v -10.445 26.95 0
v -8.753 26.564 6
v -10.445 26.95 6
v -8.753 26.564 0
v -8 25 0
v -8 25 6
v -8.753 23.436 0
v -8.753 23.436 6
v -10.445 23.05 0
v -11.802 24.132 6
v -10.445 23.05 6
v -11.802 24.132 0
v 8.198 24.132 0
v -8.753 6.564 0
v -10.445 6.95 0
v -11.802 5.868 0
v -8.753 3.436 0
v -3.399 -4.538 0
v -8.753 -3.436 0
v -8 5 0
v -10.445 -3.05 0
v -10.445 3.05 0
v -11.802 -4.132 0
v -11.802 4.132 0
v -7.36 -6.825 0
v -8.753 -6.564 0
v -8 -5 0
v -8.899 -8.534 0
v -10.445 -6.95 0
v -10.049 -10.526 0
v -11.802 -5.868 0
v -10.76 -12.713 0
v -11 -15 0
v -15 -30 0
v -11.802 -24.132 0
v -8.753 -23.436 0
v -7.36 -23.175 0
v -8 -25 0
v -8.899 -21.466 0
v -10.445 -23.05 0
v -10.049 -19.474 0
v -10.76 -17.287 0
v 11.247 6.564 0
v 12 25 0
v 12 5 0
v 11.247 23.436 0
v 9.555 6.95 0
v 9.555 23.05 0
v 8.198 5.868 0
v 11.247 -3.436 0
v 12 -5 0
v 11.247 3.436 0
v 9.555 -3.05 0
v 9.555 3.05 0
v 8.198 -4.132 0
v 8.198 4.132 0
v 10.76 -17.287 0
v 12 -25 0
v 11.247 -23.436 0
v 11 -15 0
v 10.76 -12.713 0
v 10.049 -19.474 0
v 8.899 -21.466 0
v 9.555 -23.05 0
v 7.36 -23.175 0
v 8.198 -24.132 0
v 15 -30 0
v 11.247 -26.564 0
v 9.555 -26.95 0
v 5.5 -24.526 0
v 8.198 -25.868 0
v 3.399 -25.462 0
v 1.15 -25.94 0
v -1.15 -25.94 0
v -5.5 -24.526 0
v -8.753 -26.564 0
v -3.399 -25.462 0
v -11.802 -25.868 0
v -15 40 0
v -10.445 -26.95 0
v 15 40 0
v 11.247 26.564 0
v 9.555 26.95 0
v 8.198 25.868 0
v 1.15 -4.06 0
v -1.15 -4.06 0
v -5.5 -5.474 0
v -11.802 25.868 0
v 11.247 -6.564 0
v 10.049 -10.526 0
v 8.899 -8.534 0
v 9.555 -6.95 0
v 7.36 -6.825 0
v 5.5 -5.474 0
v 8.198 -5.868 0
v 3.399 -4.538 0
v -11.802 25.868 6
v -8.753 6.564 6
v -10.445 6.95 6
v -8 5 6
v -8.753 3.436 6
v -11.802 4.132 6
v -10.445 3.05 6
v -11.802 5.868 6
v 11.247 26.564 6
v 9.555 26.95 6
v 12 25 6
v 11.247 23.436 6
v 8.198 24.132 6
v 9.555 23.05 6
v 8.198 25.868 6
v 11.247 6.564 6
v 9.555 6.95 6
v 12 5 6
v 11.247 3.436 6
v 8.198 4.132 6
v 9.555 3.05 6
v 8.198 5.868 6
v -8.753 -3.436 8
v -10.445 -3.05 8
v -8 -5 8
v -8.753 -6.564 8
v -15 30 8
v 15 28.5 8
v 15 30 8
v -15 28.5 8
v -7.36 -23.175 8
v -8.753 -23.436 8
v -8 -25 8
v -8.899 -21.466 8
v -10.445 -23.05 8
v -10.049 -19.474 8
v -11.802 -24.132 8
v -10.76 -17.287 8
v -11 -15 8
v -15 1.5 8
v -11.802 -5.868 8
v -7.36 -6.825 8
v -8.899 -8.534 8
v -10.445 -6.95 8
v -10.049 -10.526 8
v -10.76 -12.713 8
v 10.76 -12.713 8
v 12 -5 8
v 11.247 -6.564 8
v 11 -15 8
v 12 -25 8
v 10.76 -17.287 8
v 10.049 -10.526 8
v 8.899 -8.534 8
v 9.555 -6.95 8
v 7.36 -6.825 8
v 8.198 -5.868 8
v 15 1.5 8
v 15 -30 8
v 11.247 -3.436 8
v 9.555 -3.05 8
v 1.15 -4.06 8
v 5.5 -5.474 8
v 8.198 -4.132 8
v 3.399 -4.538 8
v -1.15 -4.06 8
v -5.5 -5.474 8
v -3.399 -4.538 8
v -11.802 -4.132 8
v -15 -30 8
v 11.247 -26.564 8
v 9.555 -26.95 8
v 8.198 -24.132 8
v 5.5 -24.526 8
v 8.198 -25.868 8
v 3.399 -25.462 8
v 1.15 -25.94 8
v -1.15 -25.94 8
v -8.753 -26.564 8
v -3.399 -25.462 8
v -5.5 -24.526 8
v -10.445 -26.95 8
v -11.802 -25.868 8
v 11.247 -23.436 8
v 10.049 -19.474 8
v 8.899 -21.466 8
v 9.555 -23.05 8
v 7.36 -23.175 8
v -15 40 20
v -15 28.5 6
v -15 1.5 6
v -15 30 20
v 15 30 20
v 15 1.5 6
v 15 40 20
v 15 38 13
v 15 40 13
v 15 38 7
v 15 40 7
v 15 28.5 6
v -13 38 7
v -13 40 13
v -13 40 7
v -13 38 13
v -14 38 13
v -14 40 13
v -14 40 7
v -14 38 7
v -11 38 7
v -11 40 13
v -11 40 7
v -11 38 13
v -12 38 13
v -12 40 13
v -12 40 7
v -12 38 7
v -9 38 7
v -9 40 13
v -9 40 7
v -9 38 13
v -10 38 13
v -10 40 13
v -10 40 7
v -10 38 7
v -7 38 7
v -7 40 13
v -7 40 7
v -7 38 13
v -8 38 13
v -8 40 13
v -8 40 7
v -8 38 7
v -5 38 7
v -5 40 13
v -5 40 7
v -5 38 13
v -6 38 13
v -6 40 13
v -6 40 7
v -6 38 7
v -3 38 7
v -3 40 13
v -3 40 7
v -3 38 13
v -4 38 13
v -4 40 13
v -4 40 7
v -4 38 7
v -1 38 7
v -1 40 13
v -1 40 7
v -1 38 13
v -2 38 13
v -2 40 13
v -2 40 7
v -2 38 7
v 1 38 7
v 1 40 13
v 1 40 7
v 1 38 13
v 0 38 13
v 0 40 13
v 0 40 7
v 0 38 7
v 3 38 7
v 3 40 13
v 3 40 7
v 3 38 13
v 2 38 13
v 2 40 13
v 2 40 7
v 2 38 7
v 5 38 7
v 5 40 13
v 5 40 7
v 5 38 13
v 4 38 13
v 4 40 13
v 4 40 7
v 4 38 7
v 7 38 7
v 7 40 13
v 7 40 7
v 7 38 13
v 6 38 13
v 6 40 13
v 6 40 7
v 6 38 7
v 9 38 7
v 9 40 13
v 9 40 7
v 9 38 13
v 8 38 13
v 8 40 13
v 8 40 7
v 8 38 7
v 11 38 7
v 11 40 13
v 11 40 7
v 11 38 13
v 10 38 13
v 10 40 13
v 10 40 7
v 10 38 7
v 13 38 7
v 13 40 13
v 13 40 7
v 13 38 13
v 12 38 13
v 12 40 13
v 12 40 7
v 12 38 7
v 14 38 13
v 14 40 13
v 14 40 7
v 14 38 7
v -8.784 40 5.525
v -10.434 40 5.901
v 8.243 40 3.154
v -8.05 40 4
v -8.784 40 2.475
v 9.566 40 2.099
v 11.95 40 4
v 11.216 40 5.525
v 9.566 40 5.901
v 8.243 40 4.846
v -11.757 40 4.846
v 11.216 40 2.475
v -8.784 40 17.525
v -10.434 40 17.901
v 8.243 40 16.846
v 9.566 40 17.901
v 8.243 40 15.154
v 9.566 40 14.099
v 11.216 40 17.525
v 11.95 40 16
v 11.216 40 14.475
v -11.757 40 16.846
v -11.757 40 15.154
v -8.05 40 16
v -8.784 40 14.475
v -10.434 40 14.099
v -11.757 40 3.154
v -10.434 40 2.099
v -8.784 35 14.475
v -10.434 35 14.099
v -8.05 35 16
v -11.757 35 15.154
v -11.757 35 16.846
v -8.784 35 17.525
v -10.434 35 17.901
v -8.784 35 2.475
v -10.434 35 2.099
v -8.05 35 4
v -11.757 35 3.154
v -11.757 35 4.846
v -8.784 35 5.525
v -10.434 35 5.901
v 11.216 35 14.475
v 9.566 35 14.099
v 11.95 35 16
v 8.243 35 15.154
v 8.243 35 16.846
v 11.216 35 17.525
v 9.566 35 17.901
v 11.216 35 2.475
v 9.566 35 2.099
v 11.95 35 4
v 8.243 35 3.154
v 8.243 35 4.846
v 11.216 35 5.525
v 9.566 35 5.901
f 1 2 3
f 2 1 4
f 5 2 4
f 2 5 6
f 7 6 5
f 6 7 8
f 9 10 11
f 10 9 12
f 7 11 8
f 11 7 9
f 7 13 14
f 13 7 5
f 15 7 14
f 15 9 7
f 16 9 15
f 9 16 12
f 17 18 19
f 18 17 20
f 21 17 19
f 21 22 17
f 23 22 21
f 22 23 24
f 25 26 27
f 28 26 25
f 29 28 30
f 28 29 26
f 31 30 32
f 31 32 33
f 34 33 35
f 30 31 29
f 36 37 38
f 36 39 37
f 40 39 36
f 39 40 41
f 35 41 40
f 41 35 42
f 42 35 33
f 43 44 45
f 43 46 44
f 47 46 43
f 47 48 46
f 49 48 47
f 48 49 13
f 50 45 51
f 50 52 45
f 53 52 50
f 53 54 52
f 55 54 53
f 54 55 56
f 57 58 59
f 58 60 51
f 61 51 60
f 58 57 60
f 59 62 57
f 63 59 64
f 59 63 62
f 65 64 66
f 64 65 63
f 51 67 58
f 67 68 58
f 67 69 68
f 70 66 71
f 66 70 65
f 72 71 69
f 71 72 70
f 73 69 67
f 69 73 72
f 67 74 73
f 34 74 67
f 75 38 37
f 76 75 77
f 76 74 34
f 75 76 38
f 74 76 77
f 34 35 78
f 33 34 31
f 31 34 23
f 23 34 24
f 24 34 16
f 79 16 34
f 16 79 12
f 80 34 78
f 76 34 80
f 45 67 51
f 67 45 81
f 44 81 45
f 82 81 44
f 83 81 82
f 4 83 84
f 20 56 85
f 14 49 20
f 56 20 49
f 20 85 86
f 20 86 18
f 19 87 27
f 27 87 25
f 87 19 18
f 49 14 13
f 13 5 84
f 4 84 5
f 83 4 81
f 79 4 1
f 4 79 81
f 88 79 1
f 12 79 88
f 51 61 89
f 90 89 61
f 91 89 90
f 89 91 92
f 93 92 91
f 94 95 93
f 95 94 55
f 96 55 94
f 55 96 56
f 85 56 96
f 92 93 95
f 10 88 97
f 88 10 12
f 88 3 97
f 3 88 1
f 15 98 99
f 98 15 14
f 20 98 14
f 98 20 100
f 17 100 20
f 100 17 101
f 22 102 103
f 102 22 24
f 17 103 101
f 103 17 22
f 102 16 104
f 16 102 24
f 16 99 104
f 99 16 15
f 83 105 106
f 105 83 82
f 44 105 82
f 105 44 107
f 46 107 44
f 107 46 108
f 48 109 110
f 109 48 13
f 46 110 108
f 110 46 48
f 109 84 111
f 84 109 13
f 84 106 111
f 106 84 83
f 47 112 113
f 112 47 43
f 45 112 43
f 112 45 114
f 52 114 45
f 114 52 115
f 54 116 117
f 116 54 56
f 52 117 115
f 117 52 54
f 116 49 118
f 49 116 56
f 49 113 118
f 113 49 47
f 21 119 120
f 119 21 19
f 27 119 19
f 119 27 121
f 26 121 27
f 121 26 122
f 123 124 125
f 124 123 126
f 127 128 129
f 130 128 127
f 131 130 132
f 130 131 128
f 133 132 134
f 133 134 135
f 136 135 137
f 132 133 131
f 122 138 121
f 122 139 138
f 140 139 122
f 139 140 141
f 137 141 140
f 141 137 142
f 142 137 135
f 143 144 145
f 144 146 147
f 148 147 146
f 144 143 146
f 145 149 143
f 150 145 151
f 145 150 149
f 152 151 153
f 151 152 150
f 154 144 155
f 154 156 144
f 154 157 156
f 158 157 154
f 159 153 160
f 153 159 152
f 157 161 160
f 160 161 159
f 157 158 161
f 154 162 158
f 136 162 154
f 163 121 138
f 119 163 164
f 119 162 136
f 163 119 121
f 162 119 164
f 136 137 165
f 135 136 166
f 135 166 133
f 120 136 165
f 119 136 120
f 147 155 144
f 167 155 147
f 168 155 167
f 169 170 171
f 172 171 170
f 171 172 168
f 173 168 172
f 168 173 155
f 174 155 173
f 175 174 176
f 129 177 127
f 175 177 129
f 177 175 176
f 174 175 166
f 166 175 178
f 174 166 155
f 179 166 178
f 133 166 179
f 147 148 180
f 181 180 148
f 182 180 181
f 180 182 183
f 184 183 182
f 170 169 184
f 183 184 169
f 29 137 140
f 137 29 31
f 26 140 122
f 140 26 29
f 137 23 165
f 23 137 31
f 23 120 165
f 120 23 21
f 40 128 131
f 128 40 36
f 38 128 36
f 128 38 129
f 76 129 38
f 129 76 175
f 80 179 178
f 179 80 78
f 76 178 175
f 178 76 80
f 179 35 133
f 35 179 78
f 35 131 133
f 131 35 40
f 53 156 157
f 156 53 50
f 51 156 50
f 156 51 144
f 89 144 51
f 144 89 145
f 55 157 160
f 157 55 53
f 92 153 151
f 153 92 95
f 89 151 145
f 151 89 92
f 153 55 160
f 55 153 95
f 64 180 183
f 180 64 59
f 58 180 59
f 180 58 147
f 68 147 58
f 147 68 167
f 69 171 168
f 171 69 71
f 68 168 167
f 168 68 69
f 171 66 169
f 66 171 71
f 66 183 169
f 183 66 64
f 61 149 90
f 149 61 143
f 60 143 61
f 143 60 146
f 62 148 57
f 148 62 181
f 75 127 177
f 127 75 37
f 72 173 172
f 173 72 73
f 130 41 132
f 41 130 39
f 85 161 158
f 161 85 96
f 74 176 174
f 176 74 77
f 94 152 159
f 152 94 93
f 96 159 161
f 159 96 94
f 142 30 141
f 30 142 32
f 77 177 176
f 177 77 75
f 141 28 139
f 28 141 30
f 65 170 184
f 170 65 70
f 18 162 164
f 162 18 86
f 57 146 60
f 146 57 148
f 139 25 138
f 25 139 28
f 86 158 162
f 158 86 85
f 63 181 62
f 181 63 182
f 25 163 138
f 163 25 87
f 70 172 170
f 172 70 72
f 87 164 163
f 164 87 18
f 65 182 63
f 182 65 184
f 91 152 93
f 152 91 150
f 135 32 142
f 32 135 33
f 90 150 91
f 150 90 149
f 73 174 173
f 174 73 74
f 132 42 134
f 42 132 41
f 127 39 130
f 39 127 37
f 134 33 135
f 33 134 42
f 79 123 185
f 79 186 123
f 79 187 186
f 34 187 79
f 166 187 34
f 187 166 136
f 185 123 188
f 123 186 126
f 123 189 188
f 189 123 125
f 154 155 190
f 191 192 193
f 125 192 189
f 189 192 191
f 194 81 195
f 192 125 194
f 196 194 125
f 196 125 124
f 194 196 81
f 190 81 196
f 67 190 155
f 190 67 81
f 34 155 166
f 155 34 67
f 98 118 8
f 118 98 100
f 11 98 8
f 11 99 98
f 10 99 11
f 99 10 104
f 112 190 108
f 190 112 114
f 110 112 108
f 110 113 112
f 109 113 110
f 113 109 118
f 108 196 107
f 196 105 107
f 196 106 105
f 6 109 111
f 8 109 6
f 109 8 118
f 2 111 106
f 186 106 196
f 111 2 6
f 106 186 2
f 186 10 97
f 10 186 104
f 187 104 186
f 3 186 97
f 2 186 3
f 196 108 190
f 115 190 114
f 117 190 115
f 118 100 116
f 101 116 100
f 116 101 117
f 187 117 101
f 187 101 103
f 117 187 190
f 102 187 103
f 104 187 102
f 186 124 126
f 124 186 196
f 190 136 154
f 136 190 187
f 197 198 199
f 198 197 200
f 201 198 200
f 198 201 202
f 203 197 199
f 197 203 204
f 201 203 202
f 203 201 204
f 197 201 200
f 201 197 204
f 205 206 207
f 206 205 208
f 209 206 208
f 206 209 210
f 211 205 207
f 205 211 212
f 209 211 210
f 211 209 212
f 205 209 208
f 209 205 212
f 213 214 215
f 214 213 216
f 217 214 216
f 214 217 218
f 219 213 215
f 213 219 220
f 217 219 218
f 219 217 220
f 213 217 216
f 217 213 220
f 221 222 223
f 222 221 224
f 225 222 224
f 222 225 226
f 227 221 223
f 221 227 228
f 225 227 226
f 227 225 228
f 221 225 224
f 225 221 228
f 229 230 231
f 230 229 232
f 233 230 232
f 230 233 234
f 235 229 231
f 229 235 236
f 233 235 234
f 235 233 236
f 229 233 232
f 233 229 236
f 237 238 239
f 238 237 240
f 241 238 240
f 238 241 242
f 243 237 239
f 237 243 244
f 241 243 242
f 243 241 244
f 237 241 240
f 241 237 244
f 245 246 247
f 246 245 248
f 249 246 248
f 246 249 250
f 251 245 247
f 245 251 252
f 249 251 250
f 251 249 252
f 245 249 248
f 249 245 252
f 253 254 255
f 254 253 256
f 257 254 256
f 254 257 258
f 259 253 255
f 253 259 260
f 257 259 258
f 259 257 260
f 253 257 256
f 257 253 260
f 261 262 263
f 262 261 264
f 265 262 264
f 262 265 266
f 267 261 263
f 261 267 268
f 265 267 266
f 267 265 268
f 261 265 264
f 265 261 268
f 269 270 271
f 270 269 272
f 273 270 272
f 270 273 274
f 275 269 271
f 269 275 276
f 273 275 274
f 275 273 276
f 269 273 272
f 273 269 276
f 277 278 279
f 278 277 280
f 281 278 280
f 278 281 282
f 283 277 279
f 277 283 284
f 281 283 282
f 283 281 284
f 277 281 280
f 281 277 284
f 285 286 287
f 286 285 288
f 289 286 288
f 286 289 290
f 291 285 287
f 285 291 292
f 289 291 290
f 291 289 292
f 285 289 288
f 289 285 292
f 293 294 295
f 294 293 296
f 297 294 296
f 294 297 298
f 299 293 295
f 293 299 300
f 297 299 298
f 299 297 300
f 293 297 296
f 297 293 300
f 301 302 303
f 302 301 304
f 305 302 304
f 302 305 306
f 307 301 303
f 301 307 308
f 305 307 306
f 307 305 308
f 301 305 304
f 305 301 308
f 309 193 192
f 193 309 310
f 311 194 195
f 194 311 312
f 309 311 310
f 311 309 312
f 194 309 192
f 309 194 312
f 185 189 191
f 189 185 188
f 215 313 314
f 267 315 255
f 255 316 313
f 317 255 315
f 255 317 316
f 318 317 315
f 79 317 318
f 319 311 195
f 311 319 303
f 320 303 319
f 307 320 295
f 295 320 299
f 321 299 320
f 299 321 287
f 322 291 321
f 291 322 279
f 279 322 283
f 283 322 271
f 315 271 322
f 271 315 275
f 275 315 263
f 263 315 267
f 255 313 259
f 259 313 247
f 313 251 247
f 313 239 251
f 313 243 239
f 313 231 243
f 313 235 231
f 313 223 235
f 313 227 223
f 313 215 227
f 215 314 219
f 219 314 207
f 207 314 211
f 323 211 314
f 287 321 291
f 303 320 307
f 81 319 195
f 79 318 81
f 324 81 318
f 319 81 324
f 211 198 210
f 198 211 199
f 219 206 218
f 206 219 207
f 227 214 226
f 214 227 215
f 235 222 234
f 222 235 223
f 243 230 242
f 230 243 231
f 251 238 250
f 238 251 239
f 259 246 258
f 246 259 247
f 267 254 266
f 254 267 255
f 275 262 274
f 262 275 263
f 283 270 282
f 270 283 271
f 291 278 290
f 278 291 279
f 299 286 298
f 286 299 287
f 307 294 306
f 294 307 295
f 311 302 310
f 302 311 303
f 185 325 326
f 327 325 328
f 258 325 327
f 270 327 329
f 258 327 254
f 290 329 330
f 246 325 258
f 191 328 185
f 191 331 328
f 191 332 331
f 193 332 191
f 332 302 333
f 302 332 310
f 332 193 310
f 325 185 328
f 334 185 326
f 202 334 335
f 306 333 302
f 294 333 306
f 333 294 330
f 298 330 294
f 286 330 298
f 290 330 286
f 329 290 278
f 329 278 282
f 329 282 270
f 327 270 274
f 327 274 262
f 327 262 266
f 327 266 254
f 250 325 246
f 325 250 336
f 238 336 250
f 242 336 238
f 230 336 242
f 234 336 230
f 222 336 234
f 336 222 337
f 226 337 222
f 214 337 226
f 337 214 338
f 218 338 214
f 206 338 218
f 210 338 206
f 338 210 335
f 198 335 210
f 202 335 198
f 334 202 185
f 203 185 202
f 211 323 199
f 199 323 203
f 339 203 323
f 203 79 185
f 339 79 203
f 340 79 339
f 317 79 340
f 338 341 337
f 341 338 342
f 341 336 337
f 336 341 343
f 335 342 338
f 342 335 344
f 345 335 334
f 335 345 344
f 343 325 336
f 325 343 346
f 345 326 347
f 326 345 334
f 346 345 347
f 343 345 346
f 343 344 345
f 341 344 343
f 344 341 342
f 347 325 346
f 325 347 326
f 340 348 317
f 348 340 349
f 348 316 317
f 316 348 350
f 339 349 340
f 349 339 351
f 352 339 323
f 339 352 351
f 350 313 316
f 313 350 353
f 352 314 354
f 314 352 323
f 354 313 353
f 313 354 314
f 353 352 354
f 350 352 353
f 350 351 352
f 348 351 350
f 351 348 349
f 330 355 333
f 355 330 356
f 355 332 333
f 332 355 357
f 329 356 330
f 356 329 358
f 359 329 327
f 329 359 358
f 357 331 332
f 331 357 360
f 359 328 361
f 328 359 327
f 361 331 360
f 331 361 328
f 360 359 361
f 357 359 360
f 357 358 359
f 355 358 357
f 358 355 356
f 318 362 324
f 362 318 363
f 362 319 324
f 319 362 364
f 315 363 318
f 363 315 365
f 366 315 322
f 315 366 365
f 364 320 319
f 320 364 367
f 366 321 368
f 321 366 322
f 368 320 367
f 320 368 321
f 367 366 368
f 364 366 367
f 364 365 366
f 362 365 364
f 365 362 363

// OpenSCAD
//Laser head mount V1

//MGN12-H Carriage 20mm x 20mm
//Cloudray K Series Laser Head 20mm x 20mm

difference(){
    linear_extrude(8){square([30,60],center=true);}
    translate([0,15,6]){linear_extrude(2){square([46,27],center=true);}}
    translate([0,15]){Carrage_Mount();}
    translate([0,-15]){Laser_Head_Mount();}
}

difference(){
linear_extrude(20){
    translate([0,35]){square([30,10],center=true);}
}
    //Belt screw holes
    translate([-10,35,16])rotate(a=[270,0,0]){cylinder(6,1.95,1.95);}
    translate([-10,35,4])rotate(a=[270,0,0]){cylinder(6,1.95,1.95);}
    translate([10,35,16])rotate(a=[270,0,0]){cylinder(6,1.95,1.95);}
    translate([10,35,4])rotate(a=[270,0,0]){cylinder(6,1.95,1.95);}

    Belt_Grooves();
}

module Belt_Grooves(){
    for(i = [0:25]){
        translate([(2*i)-14,38,7]){cube([1,3,6]);}
    }
}

module Carrage_Mount(){
    translate([-10,10]){cylinder(8,2,2);}
    translate([-10,-10]){cylinder(8,2,2);}
    translate([10,10]){cylinder(8,2,2);}
    translate([10,-10]){cylinder(8,2,2);}
}

module Laser_Head_Mount(){
    translate([-10,10]){cylinder(8,2,2);}
    translate([-10,-10]){cylinder(8,2,2);}
    translate([10,10]){cylinder(8,2,2);}
    translate([10,-10]){cylinder(8,2,2);}
    cylinder(8,11,11);
}
